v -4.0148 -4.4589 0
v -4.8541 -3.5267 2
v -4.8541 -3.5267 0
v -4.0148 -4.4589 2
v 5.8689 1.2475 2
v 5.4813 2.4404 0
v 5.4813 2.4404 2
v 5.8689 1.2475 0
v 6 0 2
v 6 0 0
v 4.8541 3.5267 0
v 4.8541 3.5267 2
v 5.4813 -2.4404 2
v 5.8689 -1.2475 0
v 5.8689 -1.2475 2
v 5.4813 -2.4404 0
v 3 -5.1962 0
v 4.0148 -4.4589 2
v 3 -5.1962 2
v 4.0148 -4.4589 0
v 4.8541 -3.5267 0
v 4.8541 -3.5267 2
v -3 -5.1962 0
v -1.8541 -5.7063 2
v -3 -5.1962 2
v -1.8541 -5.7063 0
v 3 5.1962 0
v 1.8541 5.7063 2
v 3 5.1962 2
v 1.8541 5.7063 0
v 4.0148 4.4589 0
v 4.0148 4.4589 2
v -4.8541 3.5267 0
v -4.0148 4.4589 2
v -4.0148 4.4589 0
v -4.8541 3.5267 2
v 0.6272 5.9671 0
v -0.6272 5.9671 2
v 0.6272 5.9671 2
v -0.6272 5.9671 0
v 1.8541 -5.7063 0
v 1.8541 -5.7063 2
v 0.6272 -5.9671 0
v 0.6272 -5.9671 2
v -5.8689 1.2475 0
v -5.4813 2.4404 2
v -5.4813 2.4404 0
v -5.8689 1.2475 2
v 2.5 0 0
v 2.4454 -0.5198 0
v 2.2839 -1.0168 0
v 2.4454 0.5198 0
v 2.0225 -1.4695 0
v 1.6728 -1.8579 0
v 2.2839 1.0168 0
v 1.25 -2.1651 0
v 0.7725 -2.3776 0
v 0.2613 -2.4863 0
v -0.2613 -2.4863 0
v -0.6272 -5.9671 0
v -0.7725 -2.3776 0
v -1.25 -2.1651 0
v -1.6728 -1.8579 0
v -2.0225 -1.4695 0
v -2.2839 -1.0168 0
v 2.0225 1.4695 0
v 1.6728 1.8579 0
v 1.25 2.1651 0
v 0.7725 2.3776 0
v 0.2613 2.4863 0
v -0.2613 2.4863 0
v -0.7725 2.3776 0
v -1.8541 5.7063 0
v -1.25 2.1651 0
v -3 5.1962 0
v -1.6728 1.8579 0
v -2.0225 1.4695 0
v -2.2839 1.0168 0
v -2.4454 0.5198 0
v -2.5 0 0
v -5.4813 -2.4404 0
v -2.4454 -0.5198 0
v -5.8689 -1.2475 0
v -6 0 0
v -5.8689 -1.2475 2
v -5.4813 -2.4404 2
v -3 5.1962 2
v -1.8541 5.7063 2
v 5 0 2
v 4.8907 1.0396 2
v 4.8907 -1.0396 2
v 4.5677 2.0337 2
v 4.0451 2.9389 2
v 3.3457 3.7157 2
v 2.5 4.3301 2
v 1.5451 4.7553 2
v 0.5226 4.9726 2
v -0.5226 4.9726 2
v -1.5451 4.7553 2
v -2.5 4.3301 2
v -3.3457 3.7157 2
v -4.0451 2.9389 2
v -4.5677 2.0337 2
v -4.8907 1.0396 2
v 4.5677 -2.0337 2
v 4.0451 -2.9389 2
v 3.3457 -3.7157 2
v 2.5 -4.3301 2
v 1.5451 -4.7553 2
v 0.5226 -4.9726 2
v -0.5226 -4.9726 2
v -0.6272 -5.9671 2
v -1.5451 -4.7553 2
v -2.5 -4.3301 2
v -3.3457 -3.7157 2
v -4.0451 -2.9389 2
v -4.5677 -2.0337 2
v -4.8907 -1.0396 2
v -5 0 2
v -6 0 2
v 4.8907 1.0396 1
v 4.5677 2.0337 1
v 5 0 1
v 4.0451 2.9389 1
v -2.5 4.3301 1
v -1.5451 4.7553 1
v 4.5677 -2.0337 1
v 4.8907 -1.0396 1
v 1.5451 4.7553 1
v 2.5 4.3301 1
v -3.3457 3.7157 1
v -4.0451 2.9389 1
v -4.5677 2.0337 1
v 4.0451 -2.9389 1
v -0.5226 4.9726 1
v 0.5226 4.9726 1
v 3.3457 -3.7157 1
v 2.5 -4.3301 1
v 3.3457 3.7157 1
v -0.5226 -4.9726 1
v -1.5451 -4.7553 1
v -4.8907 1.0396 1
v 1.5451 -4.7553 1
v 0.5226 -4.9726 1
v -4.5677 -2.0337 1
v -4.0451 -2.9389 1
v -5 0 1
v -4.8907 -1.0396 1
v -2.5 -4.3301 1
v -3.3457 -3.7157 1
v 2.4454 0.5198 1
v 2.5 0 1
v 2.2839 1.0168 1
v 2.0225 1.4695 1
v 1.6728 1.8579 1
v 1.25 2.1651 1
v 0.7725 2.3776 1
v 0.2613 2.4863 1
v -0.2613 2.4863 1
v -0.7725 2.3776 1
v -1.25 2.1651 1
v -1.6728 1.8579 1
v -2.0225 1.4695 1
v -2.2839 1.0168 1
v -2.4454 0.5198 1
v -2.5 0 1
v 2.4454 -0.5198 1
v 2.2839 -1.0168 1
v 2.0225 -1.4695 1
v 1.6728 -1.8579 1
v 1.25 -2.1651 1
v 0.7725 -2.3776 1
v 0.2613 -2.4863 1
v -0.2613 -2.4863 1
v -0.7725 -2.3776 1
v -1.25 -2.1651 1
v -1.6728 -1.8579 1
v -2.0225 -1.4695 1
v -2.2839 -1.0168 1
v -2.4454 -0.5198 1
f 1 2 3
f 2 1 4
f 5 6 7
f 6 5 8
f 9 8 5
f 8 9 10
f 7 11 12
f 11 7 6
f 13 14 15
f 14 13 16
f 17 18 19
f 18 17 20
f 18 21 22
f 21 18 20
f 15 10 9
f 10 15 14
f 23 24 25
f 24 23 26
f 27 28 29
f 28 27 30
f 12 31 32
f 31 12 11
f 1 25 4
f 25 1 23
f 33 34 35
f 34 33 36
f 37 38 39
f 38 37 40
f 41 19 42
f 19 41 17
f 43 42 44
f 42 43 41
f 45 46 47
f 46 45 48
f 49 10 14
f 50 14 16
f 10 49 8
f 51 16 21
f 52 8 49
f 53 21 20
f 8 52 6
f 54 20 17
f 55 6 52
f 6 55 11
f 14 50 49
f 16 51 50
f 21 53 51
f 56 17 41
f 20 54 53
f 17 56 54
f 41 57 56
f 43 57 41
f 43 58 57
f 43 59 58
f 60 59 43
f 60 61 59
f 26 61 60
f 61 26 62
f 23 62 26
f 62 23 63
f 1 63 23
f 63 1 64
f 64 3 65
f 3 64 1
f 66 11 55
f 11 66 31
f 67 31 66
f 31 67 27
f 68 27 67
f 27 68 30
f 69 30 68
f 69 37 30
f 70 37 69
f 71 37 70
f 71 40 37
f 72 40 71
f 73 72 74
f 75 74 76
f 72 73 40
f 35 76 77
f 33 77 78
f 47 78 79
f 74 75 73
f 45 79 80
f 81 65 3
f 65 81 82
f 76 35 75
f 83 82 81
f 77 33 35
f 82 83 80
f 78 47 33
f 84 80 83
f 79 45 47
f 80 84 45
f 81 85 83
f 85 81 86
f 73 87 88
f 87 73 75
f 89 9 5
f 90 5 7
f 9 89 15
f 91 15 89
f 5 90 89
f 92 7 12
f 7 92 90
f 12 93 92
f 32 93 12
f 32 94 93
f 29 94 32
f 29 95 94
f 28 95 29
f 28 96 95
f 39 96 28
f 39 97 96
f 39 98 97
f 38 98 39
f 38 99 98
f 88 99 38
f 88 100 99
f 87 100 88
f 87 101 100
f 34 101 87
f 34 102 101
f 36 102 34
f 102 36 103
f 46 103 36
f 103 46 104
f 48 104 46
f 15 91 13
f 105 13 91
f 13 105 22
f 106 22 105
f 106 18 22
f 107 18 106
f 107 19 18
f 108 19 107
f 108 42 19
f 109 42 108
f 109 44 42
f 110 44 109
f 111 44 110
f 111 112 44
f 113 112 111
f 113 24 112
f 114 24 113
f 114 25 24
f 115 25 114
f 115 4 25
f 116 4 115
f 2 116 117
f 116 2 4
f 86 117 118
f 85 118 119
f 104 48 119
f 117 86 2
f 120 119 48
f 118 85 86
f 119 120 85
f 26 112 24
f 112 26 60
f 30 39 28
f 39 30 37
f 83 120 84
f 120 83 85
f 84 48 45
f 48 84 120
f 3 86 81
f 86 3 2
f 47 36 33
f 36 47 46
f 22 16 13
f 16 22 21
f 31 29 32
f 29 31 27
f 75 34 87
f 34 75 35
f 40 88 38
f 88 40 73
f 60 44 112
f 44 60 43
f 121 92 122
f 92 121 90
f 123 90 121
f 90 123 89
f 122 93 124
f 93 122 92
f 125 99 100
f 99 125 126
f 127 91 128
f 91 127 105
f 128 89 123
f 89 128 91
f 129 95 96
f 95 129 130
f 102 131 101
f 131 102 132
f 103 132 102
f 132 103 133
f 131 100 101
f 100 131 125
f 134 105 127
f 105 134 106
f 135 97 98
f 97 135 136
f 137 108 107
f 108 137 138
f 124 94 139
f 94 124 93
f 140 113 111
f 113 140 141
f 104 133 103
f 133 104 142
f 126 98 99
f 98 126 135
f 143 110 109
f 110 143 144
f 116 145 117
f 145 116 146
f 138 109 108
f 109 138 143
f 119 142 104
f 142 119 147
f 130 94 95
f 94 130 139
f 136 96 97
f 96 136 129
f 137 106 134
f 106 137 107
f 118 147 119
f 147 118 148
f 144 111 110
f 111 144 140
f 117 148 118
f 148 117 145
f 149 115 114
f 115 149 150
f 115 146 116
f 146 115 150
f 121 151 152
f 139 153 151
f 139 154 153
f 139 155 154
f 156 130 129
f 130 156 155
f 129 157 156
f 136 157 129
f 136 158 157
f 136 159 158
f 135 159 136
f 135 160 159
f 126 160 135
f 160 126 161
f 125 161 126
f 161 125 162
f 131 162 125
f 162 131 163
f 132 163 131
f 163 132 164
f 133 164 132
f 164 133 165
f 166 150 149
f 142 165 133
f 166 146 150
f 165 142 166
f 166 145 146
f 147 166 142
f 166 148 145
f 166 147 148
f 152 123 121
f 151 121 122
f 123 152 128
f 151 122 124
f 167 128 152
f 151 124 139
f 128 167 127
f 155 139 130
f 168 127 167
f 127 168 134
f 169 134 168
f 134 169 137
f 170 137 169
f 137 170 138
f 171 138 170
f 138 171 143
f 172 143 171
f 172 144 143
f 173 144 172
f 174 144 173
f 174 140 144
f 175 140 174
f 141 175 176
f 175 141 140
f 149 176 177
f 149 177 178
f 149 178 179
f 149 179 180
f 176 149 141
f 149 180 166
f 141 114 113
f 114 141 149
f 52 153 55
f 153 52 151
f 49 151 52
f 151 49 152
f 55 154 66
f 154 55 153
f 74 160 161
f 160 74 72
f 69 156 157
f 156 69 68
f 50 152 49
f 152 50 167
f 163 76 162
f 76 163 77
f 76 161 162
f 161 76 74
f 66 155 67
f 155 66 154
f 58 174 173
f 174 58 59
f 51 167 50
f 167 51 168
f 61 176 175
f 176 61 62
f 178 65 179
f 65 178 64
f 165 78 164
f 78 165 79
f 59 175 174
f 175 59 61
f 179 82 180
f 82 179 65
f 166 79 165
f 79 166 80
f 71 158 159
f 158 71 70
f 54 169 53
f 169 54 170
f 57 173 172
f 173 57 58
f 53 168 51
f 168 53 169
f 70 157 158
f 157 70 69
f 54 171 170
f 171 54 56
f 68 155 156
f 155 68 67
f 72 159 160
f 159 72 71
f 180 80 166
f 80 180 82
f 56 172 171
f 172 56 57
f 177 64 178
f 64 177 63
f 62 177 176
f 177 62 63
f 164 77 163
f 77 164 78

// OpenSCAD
$fn = 30;
// HOLE RADIUS SIZE
HOLE_R = 2.5;
// TOTAL OUTER RADIUS
OUTER_R = 6;
// INNER RADIUS FOR SCREW
INNER_R = 5;

BASE_HEIGHT = 1;
TOTAL_HEIGHT = 2;

difference() {
	cylinder(r=OUTER_R, h=TOTAL_HEIGHT);
	translate([0,0,BASE_HEIGHT])
	cylinder(r=INNER_R, h=100);
	translate([0,0,-1])
	cylinder(r=HOLE_R, h=100);
}
